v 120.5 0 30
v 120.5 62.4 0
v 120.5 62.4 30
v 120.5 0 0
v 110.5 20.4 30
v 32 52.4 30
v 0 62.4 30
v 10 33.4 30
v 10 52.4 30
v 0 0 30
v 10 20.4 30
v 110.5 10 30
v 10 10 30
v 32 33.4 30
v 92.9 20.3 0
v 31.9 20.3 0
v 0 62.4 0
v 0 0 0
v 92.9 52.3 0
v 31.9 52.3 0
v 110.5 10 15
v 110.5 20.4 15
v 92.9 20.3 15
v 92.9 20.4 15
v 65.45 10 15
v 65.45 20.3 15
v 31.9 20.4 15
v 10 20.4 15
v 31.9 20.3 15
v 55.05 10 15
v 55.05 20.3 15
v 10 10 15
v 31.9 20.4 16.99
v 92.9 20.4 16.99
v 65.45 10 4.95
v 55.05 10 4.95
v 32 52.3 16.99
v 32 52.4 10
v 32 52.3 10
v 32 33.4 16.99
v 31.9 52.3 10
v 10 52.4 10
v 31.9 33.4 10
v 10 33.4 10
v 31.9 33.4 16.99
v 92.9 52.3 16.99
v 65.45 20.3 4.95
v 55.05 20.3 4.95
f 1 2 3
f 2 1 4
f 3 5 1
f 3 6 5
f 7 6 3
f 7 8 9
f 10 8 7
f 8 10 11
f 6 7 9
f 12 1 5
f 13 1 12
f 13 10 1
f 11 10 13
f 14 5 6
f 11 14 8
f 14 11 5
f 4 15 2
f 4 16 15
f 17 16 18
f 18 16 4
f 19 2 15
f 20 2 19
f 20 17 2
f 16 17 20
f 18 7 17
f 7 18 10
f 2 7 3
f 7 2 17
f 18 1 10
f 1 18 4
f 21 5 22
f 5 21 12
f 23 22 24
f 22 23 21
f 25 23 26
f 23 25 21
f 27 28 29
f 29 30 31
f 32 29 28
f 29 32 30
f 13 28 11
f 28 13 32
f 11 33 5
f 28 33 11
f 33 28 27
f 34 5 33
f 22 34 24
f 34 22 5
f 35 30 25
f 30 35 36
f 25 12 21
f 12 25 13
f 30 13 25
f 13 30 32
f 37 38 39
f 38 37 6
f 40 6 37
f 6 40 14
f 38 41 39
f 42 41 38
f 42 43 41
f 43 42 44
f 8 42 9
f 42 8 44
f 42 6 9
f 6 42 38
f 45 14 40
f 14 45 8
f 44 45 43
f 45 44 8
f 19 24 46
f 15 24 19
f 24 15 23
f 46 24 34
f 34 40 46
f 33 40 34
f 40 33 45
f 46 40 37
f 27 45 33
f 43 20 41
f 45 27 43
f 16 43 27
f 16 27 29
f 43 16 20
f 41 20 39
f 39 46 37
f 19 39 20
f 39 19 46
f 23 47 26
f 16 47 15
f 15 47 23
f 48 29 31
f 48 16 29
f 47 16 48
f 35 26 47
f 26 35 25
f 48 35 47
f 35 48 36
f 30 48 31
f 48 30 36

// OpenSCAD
plexiDicke=10.4;
plexiLaenge=100.5;
plexiInKonsole=15;

BattHalterDicke=32;
BattHalterLaenge=61;
BattZ=17;

SchalterBreite=19;
SchalterLaenge=22;
SchalterEindringZ=20; // Ohne Bearbeitung 20 und mit Abzwicken 15

Rand=10;

konsZ=30;
konsY=Rand+plexiDicke+BattHalterDicke+Rand;
konsX=plexiLaenge+2*Rand;

LEDTiefe=10;


module konsole() {
  difference() {
    cube(size=[konsX,konsY,konsZ]);

    // Plexi
    translate([Rand,Rand,konsZ-plexiInKonsole]) {
        cube(size=[plexiLaenge,plexiDicke,plexiInKonsole+0.2]);
    }

    // Schalter
    translate([Rand, konsY-Rand-SchalterBreite, konsZ-SchalterEindringZ]) {
        cube(size=[SchalterLaenge, SchalterBreite, SchalterEindringZ+0.1]);
    }

    // Batteriefach
    translate([Rand+SchalterLaenge-0.1, Rand+plexiDicke-0.1, -0.01]) {
        cube(size=[BattHalterLaenge, BattHalterDicke, BattZ]);
    }

    // Aussparung für LED
    translate([konsX/2, Rand+plexiDicke/2, konsZ-plexiInKonsole-LEDTiefe/2]) {
        cube(size=[plexiDicke, plexiDicke, LEDTiefe+0.1], center=true);
    }
  }
}


// 2D Oben für DXF Export
module oben2D() {
  projection(cut=true) translate([0,0,-konsZ+0.1]) konsole();
}
// 2D Unten für DXF Export
module unten2D() {
  projection(cut=true) translate([0,0,-0.1]) konsole();
}
// 2D Mitte für DXF Export
module mitte2D() {
  projection(cut=true) translate([0,0,-konsZ+plexiInKonsole+0.1]) konsole();
}

konsole();
//oben2D();
//mitte2D();
